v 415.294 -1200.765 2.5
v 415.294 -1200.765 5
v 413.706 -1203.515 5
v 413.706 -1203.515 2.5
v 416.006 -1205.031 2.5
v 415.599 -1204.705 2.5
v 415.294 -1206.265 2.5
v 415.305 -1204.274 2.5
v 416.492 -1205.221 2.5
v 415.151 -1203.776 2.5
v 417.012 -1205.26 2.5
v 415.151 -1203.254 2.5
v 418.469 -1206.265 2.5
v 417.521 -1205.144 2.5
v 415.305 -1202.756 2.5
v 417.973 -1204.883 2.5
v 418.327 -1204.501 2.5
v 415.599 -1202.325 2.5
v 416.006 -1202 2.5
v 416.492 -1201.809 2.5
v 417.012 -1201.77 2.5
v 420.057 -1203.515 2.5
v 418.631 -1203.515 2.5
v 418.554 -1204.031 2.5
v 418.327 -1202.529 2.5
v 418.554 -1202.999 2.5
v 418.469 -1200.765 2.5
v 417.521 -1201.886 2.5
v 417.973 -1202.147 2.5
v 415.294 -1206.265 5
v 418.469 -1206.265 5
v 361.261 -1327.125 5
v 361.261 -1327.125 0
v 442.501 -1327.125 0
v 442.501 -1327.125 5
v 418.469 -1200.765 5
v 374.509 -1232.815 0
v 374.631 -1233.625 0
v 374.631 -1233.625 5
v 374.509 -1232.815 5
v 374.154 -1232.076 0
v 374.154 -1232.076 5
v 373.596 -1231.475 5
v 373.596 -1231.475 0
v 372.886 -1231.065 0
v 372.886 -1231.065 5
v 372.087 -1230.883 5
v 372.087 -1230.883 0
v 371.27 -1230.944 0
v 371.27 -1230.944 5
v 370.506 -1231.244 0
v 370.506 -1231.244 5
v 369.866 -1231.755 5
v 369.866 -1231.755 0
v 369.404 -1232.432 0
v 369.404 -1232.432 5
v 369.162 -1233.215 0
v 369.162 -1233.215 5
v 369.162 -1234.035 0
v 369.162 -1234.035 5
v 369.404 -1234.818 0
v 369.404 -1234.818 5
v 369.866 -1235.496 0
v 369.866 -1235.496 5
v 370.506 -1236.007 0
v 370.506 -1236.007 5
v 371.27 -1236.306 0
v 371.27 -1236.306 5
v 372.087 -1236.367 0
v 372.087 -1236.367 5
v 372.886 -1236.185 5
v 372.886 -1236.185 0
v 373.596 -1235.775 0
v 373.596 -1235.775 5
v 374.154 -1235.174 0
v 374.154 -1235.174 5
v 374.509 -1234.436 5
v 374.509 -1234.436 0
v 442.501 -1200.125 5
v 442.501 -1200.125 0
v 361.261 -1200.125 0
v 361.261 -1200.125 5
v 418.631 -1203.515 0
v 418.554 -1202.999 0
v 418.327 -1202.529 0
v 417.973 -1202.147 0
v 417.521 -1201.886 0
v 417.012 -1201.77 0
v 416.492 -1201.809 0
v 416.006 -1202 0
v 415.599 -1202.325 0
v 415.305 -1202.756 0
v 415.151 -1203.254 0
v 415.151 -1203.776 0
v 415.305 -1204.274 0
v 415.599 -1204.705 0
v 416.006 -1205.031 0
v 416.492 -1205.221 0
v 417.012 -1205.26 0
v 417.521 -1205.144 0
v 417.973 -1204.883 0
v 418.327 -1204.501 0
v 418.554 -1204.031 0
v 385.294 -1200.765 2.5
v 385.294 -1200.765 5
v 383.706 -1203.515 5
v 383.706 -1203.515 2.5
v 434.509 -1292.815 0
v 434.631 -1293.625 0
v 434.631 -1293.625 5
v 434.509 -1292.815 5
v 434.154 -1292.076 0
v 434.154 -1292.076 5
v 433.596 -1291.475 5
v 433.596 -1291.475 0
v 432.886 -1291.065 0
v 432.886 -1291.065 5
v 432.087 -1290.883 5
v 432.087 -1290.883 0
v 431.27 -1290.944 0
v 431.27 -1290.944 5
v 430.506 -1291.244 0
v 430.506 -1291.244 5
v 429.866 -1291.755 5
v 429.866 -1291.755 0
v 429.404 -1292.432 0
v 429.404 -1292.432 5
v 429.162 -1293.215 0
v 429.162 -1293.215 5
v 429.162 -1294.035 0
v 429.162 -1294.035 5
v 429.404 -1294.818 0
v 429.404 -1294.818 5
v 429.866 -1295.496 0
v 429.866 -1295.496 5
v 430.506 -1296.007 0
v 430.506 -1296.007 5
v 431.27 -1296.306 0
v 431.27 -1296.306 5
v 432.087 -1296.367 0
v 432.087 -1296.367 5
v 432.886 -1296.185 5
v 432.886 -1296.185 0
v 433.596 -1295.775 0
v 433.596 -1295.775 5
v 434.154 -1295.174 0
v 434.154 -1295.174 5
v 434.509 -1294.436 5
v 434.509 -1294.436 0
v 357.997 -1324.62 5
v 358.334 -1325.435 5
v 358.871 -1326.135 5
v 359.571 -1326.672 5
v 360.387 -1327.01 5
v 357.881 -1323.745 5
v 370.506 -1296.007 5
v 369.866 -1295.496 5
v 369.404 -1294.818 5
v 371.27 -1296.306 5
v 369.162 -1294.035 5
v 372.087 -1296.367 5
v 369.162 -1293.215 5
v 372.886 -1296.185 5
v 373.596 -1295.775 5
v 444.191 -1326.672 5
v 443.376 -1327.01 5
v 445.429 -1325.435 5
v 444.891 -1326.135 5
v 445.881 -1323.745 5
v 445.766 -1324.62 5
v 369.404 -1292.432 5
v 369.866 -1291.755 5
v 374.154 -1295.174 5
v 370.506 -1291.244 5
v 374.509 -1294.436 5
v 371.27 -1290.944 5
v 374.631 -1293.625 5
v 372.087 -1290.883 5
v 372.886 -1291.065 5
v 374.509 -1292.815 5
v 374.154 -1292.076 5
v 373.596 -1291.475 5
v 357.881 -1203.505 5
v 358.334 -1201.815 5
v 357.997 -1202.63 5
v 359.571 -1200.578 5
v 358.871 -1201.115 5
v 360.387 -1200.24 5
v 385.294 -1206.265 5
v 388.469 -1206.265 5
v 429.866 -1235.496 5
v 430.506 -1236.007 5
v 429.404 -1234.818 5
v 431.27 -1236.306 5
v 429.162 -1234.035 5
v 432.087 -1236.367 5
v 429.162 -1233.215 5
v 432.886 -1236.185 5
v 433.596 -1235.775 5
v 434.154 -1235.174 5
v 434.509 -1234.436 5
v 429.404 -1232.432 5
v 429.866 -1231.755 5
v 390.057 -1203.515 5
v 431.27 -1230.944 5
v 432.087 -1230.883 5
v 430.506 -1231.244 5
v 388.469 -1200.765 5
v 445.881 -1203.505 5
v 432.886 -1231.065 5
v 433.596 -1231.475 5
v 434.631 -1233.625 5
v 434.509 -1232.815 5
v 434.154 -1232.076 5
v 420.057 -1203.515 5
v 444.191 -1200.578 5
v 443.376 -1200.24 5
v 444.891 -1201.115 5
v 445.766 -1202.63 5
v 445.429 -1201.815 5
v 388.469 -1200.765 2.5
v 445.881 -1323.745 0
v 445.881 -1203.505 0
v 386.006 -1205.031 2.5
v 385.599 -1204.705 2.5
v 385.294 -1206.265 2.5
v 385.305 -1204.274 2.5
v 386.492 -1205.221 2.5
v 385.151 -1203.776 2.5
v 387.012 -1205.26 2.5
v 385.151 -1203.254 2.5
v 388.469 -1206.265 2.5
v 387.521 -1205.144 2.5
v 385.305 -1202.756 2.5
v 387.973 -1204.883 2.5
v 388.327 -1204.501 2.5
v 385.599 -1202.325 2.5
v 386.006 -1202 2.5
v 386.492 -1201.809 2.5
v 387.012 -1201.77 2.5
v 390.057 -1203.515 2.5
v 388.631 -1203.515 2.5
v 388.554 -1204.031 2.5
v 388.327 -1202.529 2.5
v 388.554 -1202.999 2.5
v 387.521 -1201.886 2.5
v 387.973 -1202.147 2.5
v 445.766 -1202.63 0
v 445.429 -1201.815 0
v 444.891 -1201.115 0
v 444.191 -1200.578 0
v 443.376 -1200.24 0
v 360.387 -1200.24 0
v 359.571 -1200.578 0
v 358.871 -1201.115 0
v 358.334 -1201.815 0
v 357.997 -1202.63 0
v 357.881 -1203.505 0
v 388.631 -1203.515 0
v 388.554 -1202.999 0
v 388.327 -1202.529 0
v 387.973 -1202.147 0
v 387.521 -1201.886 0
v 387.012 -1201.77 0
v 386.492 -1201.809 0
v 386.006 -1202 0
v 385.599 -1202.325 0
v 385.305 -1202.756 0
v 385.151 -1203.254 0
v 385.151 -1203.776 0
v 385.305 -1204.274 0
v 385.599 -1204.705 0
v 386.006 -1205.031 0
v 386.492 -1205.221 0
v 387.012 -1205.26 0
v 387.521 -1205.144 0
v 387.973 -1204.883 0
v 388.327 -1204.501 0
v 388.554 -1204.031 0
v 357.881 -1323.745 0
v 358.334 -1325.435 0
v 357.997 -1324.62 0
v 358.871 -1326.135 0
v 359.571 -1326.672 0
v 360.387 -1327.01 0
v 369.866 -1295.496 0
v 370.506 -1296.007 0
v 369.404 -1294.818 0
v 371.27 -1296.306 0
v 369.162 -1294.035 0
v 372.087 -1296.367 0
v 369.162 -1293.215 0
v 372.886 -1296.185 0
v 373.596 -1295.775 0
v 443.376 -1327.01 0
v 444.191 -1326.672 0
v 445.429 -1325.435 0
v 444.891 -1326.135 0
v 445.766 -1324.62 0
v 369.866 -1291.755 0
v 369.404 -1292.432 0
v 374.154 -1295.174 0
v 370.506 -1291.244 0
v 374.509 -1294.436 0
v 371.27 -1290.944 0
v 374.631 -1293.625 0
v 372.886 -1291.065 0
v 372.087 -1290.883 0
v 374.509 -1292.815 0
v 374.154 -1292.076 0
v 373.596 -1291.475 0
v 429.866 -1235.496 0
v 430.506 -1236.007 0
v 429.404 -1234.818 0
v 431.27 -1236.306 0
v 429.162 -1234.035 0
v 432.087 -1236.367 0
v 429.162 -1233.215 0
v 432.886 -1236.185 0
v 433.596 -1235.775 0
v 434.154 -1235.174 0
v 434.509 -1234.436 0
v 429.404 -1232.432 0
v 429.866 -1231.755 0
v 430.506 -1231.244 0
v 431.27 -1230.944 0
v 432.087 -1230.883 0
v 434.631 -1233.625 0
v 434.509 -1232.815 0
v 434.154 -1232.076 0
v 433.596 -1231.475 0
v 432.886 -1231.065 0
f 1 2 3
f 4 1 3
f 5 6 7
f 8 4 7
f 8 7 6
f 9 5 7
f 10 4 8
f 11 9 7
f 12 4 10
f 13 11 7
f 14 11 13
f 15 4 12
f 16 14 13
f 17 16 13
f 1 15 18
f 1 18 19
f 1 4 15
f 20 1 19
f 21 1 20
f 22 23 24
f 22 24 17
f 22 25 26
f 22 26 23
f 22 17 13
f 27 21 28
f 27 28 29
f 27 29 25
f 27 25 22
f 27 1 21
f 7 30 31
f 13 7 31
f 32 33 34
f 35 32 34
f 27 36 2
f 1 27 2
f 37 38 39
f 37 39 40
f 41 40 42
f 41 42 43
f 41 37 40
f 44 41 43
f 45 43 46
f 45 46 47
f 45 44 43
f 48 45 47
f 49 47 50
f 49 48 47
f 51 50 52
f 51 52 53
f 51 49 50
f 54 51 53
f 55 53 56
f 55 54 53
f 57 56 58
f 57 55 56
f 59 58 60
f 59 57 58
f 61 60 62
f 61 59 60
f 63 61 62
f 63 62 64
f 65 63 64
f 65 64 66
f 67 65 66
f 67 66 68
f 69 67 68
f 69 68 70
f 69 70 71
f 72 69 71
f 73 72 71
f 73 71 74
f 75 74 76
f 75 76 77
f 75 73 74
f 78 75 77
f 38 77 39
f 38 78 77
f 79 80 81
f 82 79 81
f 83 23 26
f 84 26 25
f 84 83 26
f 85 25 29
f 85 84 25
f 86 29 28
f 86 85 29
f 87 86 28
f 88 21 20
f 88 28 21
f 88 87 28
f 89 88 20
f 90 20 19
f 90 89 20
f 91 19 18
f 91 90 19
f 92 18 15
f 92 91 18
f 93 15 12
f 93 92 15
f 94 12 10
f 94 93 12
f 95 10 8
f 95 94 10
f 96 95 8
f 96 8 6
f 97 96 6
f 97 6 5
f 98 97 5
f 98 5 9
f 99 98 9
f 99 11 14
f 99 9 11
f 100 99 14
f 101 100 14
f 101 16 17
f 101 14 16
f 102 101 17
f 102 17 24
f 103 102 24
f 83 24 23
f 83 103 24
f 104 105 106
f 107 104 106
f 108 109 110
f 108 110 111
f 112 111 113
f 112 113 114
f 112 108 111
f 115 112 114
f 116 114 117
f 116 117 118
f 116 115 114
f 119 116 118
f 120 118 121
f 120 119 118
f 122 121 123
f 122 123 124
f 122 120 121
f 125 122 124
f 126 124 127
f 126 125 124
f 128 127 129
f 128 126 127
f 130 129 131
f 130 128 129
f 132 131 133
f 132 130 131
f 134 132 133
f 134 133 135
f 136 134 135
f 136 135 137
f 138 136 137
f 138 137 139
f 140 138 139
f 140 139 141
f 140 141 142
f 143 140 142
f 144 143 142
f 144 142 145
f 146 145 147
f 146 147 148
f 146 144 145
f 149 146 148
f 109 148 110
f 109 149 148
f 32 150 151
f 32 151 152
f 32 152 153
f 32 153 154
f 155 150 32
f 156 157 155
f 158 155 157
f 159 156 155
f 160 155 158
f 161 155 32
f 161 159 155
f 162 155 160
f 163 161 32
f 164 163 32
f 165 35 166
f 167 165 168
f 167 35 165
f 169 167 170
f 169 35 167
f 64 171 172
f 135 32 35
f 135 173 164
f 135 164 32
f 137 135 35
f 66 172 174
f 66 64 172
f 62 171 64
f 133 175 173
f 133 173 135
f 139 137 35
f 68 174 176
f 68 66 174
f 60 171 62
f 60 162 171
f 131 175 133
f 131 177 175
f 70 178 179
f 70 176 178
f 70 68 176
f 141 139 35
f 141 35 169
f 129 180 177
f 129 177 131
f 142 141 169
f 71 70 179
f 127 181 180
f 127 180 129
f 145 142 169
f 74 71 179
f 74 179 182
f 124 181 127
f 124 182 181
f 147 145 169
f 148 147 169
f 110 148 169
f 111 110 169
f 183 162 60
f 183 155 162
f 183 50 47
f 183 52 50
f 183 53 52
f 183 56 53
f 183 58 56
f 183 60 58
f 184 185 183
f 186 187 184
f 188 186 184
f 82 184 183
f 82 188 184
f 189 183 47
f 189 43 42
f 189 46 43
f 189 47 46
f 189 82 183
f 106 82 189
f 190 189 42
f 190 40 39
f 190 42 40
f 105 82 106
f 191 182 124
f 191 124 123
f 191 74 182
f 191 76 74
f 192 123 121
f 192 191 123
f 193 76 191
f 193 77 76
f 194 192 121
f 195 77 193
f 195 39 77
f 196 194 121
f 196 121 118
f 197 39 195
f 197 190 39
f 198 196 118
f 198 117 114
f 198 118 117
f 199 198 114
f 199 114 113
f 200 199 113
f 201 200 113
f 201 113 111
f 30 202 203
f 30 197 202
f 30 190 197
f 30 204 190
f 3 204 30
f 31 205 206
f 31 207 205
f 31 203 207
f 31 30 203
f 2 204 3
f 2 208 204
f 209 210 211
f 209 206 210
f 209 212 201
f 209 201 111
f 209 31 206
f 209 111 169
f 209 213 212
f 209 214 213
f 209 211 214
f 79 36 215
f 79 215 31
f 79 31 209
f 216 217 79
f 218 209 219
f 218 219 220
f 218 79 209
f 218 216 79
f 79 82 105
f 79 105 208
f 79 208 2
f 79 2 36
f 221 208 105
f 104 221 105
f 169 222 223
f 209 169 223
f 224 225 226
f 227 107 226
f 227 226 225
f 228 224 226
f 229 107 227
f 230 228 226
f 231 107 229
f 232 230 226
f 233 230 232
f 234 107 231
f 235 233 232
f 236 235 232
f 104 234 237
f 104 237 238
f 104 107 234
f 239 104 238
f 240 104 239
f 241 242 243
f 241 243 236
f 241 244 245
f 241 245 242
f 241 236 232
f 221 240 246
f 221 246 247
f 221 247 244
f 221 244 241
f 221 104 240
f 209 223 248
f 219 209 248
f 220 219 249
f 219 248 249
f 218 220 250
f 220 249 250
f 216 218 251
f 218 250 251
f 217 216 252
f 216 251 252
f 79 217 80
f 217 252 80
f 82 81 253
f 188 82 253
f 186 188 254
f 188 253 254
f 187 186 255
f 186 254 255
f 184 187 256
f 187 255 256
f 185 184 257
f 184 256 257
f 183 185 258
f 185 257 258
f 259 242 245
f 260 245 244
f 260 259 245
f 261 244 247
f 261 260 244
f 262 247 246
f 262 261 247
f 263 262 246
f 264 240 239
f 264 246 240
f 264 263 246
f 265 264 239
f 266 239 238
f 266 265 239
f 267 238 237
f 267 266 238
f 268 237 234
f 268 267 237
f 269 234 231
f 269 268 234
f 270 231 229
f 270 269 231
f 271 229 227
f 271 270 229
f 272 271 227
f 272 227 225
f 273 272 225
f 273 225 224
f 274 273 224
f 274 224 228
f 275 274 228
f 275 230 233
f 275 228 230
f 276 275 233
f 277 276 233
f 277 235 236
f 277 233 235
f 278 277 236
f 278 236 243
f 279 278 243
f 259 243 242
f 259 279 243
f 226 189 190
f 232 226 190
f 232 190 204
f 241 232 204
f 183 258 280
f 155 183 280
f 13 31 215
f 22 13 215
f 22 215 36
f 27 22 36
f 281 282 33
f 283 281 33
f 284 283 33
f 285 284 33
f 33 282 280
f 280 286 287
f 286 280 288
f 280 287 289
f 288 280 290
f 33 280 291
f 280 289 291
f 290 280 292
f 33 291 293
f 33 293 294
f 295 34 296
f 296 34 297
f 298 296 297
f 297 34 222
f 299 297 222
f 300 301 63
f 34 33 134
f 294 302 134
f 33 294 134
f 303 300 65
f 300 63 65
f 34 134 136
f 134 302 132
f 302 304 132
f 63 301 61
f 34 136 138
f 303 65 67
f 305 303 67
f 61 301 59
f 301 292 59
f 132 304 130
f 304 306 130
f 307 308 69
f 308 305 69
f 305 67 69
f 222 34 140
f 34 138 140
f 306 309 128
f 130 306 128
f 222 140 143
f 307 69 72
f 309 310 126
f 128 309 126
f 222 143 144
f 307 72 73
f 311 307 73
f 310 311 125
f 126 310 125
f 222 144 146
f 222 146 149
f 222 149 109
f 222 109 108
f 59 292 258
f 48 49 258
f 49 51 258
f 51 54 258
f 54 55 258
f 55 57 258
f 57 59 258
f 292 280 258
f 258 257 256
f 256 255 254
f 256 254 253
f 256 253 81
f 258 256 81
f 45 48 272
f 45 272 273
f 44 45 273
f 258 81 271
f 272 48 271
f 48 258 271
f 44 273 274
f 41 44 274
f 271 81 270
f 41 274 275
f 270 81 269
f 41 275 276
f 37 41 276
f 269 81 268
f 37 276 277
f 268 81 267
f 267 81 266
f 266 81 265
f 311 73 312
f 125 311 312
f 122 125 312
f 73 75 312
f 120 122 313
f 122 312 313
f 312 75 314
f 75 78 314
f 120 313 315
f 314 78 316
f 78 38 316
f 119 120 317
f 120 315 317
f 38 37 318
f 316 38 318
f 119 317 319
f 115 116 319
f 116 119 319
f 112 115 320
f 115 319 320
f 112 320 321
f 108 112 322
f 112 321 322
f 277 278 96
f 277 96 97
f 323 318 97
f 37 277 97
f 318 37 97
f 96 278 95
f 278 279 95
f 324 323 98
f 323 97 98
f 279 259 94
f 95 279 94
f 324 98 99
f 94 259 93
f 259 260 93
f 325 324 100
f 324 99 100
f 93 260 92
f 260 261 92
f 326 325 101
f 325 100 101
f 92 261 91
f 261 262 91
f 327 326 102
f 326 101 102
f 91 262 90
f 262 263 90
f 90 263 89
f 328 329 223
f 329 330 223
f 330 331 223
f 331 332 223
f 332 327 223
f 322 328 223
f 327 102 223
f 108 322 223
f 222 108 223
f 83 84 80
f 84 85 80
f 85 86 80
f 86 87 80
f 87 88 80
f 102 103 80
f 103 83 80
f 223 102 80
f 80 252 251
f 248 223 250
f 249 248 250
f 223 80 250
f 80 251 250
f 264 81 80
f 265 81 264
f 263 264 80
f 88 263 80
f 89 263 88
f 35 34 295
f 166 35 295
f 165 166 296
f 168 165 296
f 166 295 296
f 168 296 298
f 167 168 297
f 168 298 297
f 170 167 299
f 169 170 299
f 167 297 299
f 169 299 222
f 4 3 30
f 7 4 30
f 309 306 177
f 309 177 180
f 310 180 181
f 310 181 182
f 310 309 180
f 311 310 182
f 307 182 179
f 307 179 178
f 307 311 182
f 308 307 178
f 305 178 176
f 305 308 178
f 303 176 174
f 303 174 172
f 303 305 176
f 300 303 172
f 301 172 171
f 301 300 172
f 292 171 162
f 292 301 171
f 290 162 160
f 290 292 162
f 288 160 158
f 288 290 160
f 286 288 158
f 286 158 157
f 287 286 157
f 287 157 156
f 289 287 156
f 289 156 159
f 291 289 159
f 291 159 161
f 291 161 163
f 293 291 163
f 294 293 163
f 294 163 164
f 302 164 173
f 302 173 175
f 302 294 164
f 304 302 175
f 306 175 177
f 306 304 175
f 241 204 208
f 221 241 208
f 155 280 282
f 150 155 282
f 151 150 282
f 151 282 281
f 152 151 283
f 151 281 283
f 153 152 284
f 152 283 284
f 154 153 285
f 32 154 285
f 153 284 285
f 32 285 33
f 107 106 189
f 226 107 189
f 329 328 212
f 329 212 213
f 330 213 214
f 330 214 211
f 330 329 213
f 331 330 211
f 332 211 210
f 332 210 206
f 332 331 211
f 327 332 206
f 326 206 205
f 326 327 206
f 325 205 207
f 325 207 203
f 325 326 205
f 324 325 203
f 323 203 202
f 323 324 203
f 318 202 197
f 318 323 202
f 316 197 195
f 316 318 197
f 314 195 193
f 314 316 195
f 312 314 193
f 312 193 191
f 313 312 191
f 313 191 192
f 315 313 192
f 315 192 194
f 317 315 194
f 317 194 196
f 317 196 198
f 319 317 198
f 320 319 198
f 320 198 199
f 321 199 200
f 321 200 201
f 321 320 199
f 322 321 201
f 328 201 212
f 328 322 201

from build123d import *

# Parameters (mm, degrees)
SKETCH1_R           = 2.75
SKETCH1_R_2         = 1.75
BOSS_EXTRUDE1_DEPTH = 5
CUT_EXTRUDE1_DEPTH  = 2.5


with BuildPart() as part:
    # Sketch1 → Boss-Extrude1 (new body)
    with BuildSketch(Plane.XY):
        with BuildLine():
            Line((445.881443411, -1323.745162979), (445.881443411, -1203.505162979))
            ThreePointArc((445.881443411, -1203.505162979), (444.891464332, -1201.115142059), (442.501443411, -1200.125162979))
            Line((442.501443411, -1200.125162979), (361.261443411, -1200.125162979))
            ThreePointArc((361.261443411, -1200.125162979), (358.871422491, -1201.115142059), (357.881443411, -1203.505162979))
            Line((357.881443411, -1203.505162979), (357.881443411, -1323.745162979))
            ThreePointArc((357.881443411, -1323.745162979), (358.871422491, -1326.1351839), (361.261443411, -1327.125162979))
            Line((361.261443411, -1327.125162979), (442.501443411, -1327.125162979))
            ThreePointArc((442.501443411, -1327.125162979), (444.891464332, -1326.1351839), (445.881443411, -1323.745162979))
        make_face()
        with Locations((371.881443411, -1233.625162979)):
            Circle(SKETCH1_R, mode=Mode.SUBTRACT)
        with Locations((431.881443411, -1233.625162979)):
            Circle(SKETCH1_R, mode=Mode.SUBTRACT)
        with Locations((371.881443411, -1293.625162979)):
            Circle(SKETCH1_R, mode=Mode.SUBTRACT)
        with Locations((431.881443411, -1293.625162979)):
            Circle(SKETCH1_R, mode=Mode.SUBTRACT)
        with Locations((386.881443411, -1203.515162979)):
            Circle(SKETCH1_R_2, mode=Mode.SUBTRACT)
        with Locations((416.881443411, -1203.515162979)):
            Circle(SKETCH1_R_2, mode=Mode.SUBTRACT)
    extrude(amount=BOSS_EXTRUDE1_DEPTH)

    # Sketch2 → Cut-Extrude1 (cut)
    with BuildSketch(Plane.XY.offset(5)):
        Polygon((388.469156651, -1200.765162979), (385.293730171, -1200.765162979), (383.706016931, -1203.515162979), (385.293730171, -1206.265162979), (388.469156651, -1206.265162979), (390.056869892, -1203.515162979), align=None)
        Polygon((418.469156651, -1200.765162979), (415.293730171, -1200.765162979), (413.706016931, -1203.515162979), (415.293730171, -1206.265162979), (418.469156651, -1206.265162979), (420.056869892, -1203.515162979), align=None)
    extrude(amount=-CUT_EXTRUDE1_DEPTH, mode=Mode.SUBTRACT)


solid = part.part
